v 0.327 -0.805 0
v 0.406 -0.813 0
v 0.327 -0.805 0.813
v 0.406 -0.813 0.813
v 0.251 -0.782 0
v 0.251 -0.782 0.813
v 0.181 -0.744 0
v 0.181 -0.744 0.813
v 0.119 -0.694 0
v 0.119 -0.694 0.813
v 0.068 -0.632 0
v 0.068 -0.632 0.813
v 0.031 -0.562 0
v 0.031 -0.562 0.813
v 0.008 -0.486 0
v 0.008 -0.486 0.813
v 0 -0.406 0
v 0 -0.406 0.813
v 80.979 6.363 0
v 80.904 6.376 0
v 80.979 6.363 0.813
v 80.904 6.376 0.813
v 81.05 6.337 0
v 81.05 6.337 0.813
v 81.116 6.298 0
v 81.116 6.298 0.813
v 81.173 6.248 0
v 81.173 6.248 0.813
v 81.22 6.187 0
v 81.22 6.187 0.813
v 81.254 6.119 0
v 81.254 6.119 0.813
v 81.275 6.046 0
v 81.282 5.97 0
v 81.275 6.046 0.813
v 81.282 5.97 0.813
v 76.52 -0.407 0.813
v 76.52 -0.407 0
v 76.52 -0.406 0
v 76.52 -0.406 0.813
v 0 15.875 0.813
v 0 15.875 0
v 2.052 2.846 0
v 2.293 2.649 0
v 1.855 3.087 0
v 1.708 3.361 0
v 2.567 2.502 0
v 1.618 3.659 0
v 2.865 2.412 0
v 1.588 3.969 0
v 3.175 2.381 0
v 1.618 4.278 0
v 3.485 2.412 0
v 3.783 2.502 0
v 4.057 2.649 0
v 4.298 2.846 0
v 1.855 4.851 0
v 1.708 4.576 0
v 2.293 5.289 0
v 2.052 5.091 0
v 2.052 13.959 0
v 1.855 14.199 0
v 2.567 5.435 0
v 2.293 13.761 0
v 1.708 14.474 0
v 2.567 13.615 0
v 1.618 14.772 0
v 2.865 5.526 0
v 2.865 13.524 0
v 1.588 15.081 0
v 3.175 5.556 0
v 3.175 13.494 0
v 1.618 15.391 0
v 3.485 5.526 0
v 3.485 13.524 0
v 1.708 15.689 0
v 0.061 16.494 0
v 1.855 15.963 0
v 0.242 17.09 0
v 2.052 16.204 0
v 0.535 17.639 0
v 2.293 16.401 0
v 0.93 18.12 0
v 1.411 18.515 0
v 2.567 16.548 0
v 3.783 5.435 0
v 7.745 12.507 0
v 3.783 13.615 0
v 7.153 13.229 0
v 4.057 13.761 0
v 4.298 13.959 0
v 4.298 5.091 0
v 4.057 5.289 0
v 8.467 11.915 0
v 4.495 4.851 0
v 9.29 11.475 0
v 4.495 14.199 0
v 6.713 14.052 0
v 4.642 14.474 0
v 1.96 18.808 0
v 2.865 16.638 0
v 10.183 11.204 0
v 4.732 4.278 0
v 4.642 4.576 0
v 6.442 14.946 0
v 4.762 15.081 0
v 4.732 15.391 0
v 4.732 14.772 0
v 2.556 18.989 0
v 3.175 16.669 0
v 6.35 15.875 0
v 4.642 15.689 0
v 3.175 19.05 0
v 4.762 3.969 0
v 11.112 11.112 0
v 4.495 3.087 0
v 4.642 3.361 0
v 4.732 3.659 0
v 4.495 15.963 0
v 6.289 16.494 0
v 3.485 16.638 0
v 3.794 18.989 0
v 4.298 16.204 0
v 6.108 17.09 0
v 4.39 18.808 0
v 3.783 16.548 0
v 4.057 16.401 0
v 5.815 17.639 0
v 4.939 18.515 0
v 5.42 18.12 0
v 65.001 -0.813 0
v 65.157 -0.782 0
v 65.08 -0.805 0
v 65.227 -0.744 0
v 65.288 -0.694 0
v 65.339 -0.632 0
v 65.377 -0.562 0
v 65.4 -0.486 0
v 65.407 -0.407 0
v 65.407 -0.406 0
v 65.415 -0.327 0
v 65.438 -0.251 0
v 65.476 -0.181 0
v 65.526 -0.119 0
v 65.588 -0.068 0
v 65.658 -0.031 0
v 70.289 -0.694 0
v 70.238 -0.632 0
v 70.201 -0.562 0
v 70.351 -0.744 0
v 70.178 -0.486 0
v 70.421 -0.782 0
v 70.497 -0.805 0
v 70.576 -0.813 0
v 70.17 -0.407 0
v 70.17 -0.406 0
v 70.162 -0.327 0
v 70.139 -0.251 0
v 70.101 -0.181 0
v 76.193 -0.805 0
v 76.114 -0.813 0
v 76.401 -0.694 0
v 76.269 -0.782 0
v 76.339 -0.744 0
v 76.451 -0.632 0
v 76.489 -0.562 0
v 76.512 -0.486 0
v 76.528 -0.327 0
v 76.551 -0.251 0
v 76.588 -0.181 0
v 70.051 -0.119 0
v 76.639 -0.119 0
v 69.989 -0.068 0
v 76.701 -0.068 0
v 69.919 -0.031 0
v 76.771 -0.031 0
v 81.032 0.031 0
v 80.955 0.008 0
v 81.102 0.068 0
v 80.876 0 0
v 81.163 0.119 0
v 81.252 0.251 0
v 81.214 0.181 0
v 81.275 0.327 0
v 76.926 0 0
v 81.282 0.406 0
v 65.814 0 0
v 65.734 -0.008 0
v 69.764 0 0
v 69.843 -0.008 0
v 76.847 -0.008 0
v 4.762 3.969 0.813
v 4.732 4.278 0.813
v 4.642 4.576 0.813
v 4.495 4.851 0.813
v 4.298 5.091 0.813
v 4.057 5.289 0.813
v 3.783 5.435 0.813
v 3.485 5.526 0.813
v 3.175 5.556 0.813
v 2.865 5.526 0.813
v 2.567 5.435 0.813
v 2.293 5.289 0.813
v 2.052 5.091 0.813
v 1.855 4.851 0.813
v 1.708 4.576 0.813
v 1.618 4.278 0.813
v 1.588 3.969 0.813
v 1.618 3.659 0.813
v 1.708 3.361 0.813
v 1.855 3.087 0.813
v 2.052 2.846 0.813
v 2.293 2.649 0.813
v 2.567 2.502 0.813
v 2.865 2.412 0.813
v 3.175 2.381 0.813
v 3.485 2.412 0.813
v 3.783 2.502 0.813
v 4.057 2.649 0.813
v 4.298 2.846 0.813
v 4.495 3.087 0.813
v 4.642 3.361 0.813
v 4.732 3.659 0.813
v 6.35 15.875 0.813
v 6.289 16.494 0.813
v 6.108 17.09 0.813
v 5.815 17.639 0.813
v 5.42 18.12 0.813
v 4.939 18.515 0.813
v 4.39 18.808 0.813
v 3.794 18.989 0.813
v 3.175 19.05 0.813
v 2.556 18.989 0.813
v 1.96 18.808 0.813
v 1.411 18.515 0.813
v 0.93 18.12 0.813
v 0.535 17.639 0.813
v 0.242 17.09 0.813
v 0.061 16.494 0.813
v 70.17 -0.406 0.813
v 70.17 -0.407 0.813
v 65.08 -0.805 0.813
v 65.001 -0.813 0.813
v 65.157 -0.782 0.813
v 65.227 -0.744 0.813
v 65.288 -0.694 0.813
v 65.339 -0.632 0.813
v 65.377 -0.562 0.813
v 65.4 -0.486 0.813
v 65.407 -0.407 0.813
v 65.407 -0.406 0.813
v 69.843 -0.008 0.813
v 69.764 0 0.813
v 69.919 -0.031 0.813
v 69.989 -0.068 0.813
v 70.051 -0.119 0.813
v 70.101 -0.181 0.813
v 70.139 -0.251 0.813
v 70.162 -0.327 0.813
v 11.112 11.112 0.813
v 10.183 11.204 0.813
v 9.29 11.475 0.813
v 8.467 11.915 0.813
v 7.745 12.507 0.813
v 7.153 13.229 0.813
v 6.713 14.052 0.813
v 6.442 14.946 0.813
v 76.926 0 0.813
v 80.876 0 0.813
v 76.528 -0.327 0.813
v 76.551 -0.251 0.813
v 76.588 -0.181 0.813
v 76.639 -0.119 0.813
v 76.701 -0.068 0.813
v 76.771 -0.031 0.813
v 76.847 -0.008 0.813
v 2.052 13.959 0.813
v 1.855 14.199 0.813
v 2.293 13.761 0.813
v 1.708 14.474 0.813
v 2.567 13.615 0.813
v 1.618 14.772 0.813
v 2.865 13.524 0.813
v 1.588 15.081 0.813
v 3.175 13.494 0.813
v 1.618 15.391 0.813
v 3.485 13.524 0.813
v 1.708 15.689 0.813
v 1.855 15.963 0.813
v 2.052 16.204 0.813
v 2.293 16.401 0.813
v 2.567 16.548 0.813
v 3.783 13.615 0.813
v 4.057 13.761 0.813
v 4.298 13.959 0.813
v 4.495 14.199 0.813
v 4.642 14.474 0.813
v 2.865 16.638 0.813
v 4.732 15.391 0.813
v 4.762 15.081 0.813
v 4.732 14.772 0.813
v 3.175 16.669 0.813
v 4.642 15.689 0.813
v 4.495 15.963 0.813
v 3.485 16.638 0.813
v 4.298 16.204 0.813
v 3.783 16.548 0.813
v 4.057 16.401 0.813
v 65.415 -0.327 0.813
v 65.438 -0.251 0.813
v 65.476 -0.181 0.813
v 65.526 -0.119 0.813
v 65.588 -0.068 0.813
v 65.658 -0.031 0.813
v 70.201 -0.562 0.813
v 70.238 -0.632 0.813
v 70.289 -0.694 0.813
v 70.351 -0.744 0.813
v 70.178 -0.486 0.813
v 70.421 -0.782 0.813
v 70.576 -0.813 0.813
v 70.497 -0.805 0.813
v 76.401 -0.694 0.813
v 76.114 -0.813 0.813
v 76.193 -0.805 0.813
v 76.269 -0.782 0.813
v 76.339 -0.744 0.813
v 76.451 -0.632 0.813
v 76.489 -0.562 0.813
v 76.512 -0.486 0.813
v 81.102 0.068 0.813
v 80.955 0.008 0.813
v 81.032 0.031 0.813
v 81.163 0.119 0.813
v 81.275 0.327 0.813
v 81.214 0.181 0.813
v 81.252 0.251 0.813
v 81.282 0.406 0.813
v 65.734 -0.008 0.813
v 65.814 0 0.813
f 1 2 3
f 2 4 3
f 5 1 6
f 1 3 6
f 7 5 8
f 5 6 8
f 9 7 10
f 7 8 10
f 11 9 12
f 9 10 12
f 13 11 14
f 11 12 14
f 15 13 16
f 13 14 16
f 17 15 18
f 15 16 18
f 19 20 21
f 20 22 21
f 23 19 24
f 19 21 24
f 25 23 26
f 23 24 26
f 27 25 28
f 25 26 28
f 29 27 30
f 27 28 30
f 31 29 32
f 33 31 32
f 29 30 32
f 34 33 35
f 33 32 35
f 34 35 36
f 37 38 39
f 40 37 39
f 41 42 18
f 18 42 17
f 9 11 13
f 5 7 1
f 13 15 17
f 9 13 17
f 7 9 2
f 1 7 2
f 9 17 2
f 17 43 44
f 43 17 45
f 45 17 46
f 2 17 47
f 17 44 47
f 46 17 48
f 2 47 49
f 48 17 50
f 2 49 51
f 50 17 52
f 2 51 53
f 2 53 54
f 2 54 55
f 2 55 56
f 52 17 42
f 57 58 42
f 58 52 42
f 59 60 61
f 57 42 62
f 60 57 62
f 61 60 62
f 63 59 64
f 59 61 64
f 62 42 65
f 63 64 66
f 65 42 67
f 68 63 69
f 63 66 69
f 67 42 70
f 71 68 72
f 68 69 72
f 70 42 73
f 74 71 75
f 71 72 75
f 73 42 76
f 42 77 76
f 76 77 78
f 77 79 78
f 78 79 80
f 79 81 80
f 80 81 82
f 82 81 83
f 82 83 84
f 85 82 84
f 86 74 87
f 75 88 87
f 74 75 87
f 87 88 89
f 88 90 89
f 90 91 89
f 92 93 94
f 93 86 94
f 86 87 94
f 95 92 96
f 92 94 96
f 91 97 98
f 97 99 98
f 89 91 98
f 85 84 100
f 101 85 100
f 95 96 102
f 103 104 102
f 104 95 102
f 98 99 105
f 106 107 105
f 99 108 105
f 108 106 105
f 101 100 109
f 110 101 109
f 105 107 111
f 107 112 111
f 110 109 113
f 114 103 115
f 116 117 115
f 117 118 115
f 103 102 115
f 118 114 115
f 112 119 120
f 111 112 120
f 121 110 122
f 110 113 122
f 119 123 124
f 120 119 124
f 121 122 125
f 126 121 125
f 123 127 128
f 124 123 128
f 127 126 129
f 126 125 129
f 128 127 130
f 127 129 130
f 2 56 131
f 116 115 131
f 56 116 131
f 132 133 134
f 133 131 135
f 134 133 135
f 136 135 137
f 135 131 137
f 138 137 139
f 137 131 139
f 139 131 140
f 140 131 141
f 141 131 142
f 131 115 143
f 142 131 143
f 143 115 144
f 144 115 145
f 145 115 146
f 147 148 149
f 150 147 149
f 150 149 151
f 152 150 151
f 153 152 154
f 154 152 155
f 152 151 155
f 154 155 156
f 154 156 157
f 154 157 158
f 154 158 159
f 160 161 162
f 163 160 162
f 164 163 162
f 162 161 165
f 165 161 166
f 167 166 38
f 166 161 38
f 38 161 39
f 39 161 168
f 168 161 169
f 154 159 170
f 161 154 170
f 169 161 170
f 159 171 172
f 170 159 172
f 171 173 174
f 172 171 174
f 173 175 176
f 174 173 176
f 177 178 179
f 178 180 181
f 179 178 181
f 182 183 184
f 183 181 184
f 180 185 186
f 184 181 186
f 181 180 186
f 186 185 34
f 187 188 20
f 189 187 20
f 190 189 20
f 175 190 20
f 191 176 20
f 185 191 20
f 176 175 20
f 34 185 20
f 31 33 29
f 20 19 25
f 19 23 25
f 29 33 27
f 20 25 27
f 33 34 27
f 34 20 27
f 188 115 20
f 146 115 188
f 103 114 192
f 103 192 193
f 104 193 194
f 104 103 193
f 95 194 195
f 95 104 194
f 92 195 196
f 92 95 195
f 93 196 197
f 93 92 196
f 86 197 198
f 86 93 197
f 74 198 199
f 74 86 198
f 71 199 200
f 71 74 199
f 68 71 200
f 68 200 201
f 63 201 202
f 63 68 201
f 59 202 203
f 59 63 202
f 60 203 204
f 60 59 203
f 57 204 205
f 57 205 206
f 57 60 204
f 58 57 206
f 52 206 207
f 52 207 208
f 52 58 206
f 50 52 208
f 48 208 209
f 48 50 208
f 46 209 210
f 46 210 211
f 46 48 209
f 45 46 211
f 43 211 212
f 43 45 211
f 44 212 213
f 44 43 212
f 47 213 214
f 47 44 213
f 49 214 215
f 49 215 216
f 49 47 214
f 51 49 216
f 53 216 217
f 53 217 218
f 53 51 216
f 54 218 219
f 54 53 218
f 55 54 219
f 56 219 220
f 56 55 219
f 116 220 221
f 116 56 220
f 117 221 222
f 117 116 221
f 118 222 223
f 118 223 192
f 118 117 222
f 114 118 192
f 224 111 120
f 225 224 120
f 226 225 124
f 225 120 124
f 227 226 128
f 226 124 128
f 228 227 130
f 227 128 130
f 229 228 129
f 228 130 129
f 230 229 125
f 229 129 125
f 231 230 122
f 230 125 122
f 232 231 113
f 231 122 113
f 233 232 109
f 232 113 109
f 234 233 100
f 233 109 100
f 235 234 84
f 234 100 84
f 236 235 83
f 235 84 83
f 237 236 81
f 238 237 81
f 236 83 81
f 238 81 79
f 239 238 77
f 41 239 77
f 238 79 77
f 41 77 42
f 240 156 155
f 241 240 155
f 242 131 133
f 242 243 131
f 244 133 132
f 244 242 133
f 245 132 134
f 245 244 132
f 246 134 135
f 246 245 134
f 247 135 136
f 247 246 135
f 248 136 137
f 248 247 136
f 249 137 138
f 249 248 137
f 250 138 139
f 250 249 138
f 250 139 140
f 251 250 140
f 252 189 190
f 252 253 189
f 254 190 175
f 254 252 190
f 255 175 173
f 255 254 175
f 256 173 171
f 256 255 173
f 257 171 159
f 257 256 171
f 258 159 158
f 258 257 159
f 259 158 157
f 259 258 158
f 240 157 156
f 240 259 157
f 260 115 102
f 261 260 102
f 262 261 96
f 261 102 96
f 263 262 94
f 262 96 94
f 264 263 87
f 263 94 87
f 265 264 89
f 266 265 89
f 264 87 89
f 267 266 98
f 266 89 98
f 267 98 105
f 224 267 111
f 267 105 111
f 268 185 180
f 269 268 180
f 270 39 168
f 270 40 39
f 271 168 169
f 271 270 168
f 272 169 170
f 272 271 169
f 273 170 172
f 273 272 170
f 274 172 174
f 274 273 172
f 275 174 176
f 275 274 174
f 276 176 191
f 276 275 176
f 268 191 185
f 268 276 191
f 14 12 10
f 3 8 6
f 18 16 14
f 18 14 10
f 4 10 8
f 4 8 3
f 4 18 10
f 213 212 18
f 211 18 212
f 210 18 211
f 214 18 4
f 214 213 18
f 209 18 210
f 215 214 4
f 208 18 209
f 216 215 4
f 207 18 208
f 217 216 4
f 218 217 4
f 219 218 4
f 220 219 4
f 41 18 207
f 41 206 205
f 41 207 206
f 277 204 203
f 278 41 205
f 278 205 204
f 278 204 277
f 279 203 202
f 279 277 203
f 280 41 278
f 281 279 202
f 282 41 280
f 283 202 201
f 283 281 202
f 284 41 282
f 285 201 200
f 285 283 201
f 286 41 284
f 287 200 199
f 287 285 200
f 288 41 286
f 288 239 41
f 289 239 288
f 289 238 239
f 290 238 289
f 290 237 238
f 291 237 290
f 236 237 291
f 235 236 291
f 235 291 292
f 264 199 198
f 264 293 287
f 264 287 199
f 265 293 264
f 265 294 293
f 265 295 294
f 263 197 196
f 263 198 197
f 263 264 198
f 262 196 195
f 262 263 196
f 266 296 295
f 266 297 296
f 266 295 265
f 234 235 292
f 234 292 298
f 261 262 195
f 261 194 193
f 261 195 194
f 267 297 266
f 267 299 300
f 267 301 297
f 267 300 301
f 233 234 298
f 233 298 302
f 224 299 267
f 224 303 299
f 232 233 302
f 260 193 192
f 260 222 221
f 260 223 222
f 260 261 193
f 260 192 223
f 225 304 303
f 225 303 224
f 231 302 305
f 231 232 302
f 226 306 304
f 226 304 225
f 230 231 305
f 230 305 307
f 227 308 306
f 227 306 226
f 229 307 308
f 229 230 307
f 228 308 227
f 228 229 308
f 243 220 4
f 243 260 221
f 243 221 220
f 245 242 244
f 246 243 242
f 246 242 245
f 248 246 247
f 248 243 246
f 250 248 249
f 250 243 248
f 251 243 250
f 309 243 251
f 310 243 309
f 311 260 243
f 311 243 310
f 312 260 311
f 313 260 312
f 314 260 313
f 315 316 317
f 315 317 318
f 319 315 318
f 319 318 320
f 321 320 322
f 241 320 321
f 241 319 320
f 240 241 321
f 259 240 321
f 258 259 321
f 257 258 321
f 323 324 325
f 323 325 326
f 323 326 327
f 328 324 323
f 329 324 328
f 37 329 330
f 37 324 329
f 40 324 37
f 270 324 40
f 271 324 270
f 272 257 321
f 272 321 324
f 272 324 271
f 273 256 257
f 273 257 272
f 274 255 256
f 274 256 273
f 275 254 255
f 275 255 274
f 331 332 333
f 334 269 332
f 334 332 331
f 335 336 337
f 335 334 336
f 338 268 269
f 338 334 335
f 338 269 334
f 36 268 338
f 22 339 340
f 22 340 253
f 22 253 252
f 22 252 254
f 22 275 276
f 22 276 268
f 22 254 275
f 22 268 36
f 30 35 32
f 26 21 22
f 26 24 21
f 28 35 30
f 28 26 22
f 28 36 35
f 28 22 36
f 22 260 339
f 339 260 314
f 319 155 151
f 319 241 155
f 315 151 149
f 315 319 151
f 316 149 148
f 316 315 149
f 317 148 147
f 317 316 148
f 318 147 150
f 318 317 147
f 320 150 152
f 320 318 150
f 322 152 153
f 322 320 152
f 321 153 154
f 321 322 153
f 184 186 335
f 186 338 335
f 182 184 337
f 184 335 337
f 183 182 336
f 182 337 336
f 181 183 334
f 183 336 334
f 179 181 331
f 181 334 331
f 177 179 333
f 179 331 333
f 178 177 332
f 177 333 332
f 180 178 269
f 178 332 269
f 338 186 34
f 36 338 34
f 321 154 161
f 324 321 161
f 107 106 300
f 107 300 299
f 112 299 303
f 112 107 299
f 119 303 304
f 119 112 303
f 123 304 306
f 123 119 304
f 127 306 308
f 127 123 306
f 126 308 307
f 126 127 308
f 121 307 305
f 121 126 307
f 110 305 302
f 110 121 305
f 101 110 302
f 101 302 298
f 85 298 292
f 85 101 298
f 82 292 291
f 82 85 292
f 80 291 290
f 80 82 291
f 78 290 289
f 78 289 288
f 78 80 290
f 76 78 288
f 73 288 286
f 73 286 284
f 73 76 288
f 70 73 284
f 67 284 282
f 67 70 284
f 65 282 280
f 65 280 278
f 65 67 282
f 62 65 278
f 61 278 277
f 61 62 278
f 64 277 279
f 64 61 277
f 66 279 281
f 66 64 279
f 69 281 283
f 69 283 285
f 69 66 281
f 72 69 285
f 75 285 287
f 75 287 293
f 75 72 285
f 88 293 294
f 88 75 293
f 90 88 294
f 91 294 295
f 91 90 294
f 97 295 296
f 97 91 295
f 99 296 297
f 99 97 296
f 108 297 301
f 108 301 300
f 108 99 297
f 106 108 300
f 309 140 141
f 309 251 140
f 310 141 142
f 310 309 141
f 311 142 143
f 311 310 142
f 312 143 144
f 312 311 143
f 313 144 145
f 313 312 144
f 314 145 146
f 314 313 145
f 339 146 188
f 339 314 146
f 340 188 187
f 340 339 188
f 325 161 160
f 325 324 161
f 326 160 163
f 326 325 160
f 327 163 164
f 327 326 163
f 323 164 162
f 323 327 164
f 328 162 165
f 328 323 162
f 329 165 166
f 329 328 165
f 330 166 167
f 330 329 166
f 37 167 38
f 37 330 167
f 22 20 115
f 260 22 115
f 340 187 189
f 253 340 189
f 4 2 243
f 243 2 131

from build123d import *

# Parameters (mm, degrees)
SKETCH1_R           = 1.5875
BOSS_EXTRUDE1_DEPTH = 0.8128
FILLET1_R           = 0.4064


with BuildPart() as part:
    # Sketch1 → Boss-Extrude1 (new body)
    with BuildSketch(Plane.XY):
        with BuildLine():
            Line((0, -0.8128), (65.4074384, -0.8128))
            Line((65.4074384, -0.8128), (65.4074384, 0))
            Line((65.4074384, 0), (70.1699384, 0))
            Line((70.1699384, 0), (70.1699384, -0.8128))
            Line((70.1699384, -0.8128), (76.5199384, -0.8128))
            Line((76.5199384, -0.8128), (76.5199384, 0))
            Line((76.5199384, 0), (81.2824384, 0))
            Line((81.2824384, 0), (81.2824384, 6.35))
            Line((81.2824384, 6.35), (11.1125, 11.1125))
            ThreePointArc((11.1125, 11.1125), (7.744903955, 12.507403955), (6.35, 15.875))
            ThreePointArc((6.35, 15.875), (3.175, 19.05), (0, 15.875))
            Line((0, 15.875), (0, -0.8128))
        make_face()
        with Locations((3.175, 3.96875)):
            Circle(SKETCH1_R, mode=Mode.SUBTRACT)
        with Locations((3.175, 15.08125)):
            Circle(SKETCH1_R, mode=Mode.SUBTRACT)
    extrude(amount=BOSS_EXTRUDE1_DEPTH)

    # Fillet1
    fillet1_edges = [part.edges().sort_by_distance(p)[0] for p in [
        (81.2824384, 6.35, 0.4064),
        (81.2824384, 0, 0.4064),
        (76.5199384, 0, 0.4064),
        (76.5199384, -0.8128, 0.4064),
        (70.1699384, -0.8128, 0.4064),
        (70.1699384, 0, 0.4064),
        (65.4074384, 0, 0.4064),
        (65.4074384, -0.8128, 0.4064),
        (0, -0.8128, 0.4064),
    ]]
    fillet(fillet1_edges, radius=FILLET1_R - 0.0001)  # a hair under: the kernel refuses the full size


solid = part.part
